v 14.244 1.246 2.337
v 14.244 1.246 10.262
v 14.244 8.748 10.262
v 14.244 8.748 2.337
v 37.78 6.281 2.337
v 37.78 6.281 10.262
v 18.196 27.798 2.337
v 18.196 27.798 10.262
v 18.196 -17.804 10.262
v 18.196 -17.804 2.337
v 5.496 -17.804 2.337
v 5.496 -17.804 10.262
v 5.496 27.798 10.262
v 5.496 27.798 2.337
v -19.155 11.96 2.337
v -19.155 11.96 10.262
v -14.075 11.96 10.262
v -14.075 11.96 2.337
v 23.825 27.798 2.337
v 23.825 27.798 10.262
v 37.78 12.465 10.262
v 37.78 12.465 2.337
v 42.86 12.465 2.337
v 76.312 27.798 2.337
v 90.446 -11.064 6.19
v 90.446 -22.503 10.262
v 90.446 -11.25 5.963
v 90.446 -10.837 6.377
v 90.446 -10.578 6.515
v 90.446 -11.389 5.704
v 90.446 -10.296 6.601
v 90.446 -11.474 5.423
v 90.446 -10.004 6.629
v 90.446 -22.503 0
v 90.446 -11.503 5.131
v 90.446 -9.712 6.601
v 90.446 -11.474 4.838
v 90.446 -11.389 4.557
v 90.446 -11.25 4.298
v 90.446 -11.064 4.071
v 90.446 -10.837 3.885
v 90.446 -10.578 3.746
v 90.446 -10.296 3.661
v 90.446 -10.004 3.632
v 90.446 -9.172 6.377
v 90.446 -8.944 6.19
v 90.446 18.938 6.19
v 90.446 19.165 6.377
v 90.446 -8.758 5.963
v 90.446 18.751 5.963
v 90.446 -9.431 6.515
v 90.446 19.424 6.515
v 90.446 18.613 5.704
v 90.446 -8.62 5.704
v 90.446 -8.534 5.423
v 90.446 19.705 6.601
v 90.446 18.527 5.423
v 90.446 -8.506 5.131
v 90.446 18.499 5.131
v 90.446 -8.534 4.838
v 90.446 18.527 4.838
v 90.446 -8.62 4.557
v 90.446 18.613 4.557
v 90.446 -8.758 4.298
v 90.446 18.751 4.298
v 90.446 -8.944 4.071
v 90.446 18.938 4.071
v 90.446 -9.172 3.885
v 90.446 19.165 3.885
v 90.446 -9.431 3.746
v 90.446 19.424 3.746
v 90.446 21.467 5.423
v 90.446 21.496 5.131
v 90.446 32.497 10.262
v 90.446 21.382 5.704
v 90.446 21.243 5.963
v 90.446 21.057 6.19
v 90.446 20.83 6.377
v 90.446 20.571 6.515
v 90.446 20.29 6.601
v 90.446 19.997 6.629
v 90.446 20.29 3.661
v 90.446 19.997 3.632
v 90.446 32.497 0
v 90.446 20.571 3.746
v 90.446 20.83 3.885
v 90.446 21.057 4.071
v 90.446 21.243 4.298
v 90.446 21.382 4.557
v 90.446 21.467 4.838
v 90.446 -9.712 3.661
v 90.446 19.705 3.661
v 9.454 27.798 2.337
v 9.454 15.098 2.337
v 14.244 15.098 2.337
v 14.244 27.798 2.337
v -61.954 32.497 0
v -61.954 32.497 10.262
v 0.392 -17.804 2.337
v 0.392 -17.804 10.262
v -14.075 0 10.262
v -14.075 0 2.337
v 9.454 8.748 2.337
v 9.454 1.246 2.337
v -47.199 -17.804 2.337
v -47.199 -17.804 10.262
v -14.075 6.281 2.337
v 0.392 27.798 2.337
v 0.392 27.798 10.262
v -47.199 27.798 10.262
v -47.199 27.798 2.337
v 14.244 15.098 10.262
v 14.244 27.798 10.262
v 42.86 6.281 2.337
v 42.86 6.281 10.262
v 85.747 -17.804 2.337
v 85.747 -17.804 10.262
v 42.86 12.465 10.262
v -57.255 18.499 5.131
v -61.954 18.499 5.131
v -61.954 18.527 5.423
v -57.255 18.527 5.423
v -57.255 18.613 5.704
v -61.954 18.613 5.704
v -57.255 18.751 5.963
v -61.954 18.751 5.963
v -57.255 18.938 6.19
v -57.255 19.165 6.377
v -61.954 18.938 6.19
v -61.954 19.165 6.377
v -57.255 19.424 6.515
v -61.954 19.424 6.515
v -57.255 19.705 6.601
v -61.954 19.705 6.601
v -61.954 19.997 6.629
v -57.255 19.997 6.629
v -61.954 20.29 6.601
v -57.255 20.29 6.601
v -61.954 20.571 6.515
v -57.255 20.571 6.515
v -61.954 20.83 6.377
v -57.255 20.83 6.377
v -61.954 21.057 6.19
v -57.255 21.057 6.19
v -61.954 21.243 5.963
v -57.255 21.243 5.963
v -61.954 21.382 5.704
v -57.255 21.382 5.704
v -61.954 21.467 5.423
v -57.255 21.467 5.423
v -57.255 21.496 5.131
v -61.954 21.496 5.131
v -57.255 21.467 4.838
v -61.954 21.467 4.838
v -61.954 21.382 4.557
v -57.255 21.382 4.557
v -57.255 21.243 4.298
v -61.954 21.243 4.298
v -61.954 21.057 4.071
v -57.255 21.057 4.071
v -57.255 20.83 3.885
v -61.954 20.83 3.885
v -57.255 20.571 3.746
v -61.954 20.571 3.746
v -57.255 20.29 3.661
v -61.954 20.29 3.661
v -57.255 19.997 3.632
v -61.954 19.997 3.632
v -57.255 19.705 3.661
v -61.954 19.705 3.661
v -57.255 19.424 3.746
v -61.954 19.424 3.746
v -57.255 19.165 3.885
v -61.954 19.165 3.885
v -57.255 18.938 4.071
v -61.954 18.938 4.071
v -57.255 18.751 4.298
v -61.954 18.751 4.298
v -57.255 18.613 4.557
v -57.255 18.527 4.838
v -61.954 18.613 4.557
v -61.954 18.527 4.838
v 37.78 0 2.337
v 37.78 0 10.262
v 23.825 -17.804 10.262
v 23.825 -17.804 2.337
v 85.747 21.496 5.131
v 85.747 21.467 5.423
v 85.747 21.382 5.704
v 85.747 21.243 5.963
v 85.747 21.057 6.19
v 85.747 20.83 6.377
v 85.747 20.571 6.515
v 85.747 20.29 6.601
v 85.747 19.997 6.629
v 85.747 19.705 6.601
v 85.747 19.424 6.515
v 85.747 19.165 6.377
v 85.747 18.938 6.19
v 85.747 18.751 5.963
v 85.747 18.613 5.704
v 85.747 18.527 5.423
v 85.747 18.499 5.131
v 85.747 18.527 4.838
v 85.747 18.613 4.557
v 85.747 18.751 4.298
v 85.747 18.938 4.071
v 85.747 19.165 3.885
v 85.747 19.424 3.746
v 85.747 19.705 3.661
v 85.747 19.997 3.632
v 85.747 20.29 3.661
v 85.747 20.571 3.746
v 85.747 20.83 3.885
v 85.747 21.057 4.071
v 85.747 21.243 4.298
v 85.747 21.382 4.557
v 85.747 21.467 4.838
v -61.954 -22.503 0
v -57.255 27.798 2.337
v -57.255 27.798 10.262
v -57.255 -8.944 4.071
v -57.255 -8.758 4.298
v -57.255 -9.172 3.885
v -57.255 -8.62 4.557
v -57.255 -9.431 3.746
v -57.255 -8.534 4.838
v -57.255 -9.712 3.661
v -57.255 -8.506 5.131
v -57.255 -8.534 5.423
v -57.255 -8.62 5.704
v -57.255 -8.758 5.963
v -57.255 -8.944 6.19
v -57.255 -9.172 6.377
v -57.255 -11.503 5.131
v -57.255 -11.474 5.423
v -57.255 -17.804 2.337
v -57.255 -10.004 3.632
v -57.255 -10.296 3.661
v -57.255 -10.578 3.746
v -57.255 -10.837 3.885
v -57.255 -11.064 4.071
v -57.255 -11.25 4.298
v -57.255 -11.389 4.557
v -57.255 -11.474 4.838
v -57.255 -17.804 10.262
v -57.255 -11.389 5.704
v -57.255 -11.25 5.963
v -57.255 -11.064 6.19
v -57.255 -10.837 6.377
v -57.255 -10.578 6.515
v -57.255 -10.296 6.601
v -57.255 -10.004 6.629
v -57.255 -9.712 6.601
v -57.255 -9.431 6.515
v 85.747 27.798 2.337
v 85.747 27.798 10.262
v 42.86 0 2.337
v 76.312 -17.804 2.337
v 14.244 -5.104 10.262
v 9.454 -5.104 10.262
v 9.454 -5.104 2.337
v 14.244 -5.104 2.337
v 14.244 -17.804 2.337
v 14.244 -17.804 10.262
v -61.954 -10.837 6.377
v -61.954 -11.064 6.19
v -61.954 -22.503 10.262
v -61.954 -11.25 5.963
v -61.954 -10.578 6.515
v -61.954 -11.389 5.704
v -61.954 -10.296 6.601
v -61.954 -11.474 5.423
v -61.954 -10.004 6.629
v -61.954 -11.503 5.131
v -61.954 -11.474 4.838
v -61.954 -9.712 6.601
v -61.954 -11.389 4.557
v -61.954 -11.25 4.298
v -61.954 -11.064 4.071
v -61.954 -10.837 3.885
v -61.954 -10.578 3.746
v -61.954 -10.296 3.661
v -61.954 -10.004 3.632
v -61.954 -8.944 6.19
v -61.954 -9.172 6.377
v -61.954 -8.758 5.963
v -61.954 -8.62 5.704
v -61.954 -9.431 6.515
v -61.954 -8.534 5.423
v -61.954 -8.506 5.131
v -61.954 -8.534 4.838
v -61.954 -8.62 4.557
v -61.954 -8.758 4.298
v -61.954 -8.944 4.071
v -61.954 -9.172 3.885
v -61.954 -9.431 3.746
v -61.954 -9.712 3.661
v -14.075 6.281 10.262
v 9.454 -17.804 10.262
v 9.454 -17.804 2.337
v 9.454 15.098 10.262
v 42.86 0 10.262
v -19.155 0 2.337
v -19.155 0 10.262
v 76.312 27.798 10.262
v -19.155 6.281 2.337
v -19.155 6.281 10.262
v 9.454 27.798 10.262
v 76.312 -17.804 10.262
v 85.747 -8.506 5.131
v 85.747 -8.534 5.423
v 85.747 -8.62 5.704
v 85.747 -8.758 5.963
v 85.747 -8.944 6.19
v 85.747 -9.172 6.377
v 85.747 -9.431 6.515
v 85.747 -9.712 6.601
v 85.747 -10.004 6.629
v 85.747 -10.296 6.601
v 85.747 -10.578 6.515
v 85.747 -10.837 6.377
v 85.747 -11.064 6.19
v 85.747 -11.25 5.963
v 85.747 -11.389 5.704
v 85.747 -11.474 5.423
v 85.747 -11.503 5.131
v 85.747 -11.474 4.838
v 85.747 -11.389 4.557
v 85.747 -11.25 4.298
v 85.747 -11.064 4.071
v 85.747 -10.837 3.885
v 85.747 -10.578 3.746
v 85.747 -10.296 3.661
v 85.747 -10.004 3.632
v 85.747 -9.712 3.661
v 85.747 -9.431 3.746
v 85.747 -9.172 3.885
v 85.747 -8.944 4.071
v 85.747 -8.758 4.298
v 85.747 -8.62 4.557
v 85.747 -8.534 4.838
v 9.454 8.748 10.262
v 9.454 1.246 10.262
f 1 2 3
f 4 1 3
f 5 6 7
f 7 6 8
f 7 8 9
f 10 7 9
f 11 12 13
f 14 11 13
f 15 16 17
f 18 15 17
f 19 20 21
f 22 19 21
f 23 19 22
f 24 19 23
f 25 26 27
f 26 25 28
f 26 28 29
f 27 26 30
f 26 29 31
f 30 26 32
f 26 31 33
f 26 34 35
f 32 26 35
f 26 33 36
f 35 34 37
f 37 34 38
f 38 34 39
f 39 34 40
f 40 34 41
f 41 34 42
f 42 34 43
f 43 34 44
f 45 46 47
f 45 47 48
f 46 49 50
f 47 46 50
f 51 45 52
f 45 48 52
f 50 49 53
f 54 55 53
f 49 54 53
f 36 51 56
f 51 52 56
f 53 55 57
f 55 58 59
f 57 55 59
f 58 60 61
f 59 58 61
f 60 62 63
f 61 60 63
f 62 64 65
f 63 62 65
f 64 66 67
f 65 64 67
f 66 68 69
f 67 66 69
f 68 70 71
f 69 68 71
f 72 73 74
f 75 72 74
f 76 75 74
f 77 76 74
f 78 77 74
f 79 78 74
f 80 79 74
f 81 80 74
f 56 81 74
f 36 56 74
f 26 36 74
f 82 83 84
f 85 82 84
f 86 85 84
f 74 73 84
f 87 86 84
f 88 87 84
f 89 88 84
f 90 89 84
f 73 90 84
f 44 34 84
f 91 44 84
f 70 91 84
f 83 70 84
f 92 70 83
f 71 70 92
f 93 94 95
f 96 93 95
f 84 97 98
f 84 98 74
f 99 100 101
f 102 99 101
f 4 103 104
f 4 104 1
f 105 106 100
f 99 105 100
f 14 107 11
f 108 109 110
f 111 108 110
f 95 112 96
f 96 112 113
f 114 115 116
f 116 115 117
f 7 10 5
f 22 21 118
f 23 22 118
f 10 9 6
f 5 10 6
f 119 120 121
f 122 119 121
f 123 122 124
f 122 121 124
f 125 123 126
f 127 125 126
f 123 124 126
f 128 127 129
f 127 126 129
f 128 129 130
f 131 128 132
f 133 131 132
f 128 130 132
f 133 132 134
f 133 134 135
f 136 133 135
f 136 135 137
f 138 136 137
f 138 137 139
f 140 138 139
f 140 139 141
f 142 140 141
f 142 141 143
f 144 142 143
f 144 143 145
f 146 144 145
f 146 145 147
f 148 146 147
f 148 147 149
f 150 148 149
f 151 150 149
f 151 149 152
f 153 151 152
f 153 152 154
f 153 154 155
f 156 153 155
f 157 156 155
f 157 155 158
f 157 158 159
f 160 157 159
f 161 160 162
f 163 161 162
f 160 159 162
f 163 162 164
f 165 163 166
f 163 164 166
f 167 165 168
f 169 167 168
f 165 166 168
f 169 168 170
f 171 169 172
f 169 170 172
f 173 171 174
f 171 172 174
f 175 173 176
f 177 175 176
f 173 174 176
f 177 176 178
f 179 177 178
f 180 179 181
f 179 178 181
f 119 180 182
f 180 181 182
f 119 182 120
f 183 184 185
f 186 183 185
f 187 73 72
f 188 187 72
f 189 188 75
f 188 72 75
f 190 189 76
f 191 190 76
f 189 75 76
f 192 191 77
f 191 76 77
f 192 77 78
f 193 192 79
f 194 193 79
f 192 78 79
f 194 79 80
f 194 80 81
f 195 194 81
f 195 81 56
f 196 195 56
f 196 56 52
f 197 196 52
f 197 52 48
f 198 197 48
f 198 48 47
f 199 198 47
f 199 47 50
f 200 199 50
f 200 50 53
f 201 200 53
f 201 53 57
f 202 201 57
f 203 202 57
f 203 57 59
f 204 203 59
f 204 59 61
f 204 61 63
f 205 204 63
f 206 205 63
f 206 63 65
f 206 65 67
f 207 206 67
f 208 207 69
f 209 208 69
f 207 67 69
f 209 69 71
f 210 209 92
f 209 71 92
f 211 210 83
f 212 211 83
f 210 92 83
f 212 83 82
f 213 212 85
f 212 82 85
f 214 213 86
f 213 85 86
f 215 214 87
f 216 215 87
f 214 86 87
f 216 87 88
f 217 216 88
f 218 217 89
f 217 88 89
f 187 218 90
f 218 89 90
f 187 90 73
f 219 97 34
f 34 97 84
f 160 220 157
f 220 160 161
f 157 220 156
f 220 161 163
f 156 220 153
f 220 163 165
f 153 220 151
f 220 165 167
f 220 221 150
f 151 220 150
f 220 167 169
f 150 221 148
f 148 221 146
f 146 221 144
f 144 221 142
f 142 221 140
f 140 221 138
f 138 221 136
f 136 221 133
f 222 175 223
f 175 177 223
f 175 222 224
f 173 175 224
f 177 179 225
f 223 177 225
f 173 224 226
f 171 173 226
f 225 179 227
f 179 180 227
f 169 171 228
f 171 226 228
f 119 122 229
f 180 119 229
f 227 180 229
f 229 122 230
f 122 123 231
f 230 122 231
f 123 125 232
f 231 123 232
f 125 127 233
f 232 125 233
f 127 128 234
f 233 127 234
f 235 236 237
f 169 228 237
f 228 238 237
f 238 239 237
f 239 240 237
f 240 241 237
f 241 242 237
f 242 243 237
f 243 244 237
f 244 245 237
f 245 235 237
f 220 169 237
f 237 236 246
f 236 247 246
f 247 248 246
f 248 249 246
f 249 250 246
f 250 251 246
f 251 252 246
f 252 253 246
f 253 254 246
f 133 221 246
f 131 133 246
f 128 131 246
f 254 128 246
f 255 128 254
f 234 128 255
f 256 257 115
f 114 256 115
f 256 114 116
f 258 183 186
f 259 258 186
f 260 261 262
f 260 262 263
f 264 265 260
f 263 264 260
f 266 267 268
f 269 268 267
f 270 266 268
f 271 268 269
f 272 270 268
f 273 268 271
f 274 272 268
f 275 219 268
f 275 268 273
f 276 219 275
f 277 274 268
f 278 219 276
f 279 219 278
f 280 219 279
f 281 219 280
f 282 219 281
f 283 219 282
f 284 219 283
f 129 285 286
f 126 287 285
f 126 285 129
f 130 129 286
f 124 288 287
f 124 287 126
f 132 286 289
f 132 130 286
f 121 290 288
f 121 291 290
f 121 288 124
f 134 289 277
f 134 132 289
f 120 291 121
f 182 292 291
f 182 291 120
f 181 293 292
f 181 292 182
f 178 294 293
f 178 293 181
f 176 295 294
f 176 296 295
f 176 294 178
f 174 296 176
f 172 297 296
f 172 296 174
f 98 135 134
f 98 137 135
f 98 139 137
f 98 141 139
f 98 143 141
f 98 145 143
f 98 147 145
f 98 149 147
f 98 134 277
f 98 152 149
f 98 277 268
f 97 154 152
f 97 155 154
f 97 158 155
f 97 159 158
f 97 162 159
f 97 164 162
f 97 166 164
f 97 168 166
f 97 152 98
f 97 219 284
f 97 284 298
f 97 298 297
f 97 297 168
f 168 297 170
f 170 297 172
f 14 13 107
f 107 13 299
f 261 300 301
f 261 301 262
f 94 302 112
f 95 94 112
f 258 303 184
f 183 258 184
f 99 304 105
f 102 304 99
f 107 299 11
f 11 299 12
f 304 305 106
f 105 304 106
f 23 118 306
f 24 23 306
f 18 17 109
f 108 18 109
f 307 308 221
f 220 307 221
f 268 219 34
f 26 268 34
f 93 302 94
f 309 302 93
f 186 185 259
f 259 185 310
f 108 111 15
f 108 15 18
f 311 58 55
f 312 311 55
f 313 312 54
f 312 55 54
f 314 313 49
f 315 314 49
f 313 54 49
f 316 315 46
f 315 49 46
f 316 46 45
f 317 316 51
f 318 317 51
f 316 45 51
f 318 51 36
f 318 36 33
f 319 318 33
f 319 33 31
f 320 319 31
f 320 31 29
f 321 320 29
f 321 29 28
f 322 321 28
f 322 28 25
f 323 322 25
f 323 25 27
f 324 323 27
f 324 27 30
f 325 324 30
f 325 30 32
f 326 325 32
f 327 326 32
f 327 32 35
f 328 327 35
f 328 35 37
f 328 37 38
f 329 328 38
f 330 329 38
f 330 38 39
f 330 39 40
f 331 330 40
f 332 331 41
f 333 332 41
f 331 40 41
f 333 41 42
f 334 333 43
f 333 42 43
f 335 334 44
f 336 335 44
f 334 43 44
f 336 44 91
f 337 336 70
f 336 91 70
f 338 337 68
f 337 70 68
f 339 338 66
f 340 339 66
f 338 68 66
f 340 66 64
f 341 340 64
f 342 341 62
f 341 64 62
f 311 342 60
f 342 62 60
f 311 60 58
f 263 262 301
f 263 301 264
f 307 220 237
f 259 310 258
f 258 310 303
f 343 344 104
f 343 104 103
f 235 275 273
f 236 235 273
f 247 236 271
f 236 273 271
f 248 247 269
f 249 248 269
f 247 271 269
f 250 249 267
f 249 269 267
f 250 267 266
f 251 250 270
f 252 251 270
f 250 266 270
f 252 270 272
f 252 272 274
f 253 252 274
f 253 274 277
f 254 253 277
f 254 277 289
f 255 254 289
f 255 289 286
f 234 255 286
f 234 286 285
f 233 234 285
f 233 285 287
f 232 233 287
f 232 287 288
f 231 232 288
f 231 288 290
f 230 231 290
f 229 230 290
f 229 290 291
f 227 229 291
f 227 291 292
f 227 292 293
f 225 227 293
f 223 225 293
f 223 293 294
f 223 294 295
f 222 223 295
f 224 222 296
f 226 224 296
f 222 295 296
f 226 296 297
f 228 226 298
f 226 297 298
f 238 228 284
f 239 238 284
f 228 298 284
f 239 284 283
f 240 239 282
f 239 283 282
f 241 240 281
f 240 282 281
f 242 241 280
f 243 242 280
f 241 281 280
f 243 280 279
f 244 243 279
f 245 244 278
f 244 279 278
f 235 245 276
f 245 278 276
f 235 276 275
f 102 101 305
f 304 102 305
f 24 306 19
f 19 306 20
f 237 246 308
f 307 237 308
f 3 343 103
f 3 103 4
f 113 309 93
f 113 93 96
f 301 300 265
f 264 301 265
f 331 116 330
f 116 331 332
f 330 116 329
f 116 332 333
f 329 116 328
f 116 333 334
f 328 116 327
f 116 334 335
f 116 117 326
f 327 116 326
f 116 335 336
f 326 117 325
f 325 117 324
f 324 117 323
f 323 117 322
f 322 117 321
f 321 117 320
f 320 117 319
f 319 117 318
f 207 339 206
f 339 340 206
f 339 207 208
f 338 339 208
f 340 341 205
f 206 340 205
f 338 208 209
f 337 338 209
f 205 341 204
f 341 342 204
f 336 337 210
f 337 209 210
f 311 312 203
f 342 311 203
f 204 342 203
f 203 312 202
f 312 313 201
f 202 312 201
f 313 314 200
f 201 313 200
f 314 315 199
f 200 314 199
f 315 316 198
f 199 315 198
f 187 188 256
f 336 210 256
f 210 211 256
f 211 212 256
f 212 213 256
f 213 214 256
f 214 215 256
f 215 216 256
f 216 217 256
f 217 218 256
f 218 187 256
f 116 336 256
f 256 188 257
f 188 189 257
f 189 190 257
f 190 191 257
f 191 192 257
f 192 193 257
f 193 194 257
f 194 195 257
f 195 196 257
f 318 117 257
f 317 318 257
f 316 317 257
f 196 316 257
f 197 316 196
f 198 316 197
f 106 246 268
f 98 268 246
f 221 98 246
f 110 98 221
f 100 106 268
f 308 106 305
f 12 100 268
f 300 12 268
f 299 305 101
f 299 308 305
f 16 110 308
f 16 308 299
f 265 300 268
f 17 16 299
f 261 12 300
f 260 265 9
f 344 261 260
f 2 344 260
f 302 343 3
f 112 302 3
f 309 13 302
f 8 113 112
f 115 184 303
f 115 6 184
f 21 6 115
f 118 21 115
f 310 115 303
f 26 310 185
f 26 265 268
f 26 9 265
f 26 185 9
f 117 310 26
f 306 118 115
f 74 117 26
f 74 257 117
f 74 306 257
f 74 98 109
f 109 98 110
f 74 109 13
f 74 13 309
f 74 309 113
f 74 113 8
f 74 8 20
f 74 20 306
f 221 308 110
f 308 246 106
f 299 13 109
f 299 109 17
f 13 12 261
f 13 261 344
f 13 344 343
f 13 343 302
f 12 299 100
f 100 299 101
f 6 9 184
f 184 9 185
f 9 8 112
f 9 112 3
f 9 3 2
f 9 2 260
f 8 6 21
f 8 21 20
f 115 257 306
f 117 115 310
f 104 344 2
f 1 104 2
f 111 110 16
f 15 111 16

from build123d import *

# Parameters (mm, degrees)
F0_W     = 152.4
F0_H     = 54.999991
F1_DEPTH = 10.2616
F2_W     = 4.790508
F2_H     = 12.7
F2_H_2   = 7.501991
F3_DEPTH = 7.9248
F5_R     = 1.4986
F6_DEPTH = 6.35
F4_R     = 1.4986
F7_DEPTH = 6.35


with BuildPart() as f1:
    # F0 (on Top) → F1 (new body)
    with BuildSketch(Plane.XY):
        with Locations((14.24603, 4.996552)):
            Rectangle(F0_W, F0_H)
    extrude(amount=F1_DEPTH)

    # F2 (on face) → F3 (cut)
    with BuildSketch(Plane.XY.offset(10.2616)):
        Polygon((-57.25497, 27.797548), (-57.25497, -17.804443), (-19.15497, 6.281104), align=None)
        Polygon((0.392403, 27.797548), (-47.199331, 27.797548), (-19.15497, 11.959886), (-14.07497, 11.959886), align=None)
        Polygon((-19.15497, 0), (-47.199331, -17.804443), (0.392403, -17.804443), (-14.07497, 0), align=None)
        Polygon((5.496245, 27.797548), (-14.07497, 6.281104), (5.496245, -17.804443), align=None)
        with Locations((11.848874, 21.447548)):
            Rectangle(F2_W, F2_H)
        with Locations((11.848874, 4.996552)):
            Rectangle(F2_W, F2_H_2)
        with Locations((11.848874, -11.454443)):
            Rectangle(F2_W, F2_H)
        Polygon((18.196245, -17.804443), (37.780095, 6.281104), (18.196245, 27.797548), align=None)
        Polygon((23.825141, -17.804443), (76.312438, -17.804443), (42.860095, 0), (37.780095, 0), align=None)
        Polygon((85.74703, 27.797548), (42.860095, 6.281104), (85.74703, -17.804443), align=None)
        Polygon((42.860095, 12.465476), (76.312438, 27.797548), (23.825141, 27.797548), (37.780095, 12.465476), align=None)
    extrude(amount=-F3_DEPTH, mode=Mode.SUBTRACT)

    # F5 (on face) → F6 (cut)
    with BuildSketch(Plane.YZ.offset(90.44603)):
        with Locations((19.997208, 5.1308)):
            Circle(F5_R)
        with Locations((-10.004103, 5.1308)):
            Circle(F5_R)
    extrude(amount=-F6_DEPTH, mode=Mode.SUBTRACT)

    # F4 (on face) → F7 (cut)
    with BuildSketch(Plane(origin=(-61.95397, 0, 0), x_dir=(0, -1, 0), z_dir=(-1, 0, 0))):
        with Locations((-19.997208, 5.1308)):
            Circle(F4_R)
        with Locations((10.004103, 5.1308)):
            Circle(F4_R)
    extrude(amount=-F7_DEPTH, mode=Mode.SUBTRACT)


solid = f1.part
